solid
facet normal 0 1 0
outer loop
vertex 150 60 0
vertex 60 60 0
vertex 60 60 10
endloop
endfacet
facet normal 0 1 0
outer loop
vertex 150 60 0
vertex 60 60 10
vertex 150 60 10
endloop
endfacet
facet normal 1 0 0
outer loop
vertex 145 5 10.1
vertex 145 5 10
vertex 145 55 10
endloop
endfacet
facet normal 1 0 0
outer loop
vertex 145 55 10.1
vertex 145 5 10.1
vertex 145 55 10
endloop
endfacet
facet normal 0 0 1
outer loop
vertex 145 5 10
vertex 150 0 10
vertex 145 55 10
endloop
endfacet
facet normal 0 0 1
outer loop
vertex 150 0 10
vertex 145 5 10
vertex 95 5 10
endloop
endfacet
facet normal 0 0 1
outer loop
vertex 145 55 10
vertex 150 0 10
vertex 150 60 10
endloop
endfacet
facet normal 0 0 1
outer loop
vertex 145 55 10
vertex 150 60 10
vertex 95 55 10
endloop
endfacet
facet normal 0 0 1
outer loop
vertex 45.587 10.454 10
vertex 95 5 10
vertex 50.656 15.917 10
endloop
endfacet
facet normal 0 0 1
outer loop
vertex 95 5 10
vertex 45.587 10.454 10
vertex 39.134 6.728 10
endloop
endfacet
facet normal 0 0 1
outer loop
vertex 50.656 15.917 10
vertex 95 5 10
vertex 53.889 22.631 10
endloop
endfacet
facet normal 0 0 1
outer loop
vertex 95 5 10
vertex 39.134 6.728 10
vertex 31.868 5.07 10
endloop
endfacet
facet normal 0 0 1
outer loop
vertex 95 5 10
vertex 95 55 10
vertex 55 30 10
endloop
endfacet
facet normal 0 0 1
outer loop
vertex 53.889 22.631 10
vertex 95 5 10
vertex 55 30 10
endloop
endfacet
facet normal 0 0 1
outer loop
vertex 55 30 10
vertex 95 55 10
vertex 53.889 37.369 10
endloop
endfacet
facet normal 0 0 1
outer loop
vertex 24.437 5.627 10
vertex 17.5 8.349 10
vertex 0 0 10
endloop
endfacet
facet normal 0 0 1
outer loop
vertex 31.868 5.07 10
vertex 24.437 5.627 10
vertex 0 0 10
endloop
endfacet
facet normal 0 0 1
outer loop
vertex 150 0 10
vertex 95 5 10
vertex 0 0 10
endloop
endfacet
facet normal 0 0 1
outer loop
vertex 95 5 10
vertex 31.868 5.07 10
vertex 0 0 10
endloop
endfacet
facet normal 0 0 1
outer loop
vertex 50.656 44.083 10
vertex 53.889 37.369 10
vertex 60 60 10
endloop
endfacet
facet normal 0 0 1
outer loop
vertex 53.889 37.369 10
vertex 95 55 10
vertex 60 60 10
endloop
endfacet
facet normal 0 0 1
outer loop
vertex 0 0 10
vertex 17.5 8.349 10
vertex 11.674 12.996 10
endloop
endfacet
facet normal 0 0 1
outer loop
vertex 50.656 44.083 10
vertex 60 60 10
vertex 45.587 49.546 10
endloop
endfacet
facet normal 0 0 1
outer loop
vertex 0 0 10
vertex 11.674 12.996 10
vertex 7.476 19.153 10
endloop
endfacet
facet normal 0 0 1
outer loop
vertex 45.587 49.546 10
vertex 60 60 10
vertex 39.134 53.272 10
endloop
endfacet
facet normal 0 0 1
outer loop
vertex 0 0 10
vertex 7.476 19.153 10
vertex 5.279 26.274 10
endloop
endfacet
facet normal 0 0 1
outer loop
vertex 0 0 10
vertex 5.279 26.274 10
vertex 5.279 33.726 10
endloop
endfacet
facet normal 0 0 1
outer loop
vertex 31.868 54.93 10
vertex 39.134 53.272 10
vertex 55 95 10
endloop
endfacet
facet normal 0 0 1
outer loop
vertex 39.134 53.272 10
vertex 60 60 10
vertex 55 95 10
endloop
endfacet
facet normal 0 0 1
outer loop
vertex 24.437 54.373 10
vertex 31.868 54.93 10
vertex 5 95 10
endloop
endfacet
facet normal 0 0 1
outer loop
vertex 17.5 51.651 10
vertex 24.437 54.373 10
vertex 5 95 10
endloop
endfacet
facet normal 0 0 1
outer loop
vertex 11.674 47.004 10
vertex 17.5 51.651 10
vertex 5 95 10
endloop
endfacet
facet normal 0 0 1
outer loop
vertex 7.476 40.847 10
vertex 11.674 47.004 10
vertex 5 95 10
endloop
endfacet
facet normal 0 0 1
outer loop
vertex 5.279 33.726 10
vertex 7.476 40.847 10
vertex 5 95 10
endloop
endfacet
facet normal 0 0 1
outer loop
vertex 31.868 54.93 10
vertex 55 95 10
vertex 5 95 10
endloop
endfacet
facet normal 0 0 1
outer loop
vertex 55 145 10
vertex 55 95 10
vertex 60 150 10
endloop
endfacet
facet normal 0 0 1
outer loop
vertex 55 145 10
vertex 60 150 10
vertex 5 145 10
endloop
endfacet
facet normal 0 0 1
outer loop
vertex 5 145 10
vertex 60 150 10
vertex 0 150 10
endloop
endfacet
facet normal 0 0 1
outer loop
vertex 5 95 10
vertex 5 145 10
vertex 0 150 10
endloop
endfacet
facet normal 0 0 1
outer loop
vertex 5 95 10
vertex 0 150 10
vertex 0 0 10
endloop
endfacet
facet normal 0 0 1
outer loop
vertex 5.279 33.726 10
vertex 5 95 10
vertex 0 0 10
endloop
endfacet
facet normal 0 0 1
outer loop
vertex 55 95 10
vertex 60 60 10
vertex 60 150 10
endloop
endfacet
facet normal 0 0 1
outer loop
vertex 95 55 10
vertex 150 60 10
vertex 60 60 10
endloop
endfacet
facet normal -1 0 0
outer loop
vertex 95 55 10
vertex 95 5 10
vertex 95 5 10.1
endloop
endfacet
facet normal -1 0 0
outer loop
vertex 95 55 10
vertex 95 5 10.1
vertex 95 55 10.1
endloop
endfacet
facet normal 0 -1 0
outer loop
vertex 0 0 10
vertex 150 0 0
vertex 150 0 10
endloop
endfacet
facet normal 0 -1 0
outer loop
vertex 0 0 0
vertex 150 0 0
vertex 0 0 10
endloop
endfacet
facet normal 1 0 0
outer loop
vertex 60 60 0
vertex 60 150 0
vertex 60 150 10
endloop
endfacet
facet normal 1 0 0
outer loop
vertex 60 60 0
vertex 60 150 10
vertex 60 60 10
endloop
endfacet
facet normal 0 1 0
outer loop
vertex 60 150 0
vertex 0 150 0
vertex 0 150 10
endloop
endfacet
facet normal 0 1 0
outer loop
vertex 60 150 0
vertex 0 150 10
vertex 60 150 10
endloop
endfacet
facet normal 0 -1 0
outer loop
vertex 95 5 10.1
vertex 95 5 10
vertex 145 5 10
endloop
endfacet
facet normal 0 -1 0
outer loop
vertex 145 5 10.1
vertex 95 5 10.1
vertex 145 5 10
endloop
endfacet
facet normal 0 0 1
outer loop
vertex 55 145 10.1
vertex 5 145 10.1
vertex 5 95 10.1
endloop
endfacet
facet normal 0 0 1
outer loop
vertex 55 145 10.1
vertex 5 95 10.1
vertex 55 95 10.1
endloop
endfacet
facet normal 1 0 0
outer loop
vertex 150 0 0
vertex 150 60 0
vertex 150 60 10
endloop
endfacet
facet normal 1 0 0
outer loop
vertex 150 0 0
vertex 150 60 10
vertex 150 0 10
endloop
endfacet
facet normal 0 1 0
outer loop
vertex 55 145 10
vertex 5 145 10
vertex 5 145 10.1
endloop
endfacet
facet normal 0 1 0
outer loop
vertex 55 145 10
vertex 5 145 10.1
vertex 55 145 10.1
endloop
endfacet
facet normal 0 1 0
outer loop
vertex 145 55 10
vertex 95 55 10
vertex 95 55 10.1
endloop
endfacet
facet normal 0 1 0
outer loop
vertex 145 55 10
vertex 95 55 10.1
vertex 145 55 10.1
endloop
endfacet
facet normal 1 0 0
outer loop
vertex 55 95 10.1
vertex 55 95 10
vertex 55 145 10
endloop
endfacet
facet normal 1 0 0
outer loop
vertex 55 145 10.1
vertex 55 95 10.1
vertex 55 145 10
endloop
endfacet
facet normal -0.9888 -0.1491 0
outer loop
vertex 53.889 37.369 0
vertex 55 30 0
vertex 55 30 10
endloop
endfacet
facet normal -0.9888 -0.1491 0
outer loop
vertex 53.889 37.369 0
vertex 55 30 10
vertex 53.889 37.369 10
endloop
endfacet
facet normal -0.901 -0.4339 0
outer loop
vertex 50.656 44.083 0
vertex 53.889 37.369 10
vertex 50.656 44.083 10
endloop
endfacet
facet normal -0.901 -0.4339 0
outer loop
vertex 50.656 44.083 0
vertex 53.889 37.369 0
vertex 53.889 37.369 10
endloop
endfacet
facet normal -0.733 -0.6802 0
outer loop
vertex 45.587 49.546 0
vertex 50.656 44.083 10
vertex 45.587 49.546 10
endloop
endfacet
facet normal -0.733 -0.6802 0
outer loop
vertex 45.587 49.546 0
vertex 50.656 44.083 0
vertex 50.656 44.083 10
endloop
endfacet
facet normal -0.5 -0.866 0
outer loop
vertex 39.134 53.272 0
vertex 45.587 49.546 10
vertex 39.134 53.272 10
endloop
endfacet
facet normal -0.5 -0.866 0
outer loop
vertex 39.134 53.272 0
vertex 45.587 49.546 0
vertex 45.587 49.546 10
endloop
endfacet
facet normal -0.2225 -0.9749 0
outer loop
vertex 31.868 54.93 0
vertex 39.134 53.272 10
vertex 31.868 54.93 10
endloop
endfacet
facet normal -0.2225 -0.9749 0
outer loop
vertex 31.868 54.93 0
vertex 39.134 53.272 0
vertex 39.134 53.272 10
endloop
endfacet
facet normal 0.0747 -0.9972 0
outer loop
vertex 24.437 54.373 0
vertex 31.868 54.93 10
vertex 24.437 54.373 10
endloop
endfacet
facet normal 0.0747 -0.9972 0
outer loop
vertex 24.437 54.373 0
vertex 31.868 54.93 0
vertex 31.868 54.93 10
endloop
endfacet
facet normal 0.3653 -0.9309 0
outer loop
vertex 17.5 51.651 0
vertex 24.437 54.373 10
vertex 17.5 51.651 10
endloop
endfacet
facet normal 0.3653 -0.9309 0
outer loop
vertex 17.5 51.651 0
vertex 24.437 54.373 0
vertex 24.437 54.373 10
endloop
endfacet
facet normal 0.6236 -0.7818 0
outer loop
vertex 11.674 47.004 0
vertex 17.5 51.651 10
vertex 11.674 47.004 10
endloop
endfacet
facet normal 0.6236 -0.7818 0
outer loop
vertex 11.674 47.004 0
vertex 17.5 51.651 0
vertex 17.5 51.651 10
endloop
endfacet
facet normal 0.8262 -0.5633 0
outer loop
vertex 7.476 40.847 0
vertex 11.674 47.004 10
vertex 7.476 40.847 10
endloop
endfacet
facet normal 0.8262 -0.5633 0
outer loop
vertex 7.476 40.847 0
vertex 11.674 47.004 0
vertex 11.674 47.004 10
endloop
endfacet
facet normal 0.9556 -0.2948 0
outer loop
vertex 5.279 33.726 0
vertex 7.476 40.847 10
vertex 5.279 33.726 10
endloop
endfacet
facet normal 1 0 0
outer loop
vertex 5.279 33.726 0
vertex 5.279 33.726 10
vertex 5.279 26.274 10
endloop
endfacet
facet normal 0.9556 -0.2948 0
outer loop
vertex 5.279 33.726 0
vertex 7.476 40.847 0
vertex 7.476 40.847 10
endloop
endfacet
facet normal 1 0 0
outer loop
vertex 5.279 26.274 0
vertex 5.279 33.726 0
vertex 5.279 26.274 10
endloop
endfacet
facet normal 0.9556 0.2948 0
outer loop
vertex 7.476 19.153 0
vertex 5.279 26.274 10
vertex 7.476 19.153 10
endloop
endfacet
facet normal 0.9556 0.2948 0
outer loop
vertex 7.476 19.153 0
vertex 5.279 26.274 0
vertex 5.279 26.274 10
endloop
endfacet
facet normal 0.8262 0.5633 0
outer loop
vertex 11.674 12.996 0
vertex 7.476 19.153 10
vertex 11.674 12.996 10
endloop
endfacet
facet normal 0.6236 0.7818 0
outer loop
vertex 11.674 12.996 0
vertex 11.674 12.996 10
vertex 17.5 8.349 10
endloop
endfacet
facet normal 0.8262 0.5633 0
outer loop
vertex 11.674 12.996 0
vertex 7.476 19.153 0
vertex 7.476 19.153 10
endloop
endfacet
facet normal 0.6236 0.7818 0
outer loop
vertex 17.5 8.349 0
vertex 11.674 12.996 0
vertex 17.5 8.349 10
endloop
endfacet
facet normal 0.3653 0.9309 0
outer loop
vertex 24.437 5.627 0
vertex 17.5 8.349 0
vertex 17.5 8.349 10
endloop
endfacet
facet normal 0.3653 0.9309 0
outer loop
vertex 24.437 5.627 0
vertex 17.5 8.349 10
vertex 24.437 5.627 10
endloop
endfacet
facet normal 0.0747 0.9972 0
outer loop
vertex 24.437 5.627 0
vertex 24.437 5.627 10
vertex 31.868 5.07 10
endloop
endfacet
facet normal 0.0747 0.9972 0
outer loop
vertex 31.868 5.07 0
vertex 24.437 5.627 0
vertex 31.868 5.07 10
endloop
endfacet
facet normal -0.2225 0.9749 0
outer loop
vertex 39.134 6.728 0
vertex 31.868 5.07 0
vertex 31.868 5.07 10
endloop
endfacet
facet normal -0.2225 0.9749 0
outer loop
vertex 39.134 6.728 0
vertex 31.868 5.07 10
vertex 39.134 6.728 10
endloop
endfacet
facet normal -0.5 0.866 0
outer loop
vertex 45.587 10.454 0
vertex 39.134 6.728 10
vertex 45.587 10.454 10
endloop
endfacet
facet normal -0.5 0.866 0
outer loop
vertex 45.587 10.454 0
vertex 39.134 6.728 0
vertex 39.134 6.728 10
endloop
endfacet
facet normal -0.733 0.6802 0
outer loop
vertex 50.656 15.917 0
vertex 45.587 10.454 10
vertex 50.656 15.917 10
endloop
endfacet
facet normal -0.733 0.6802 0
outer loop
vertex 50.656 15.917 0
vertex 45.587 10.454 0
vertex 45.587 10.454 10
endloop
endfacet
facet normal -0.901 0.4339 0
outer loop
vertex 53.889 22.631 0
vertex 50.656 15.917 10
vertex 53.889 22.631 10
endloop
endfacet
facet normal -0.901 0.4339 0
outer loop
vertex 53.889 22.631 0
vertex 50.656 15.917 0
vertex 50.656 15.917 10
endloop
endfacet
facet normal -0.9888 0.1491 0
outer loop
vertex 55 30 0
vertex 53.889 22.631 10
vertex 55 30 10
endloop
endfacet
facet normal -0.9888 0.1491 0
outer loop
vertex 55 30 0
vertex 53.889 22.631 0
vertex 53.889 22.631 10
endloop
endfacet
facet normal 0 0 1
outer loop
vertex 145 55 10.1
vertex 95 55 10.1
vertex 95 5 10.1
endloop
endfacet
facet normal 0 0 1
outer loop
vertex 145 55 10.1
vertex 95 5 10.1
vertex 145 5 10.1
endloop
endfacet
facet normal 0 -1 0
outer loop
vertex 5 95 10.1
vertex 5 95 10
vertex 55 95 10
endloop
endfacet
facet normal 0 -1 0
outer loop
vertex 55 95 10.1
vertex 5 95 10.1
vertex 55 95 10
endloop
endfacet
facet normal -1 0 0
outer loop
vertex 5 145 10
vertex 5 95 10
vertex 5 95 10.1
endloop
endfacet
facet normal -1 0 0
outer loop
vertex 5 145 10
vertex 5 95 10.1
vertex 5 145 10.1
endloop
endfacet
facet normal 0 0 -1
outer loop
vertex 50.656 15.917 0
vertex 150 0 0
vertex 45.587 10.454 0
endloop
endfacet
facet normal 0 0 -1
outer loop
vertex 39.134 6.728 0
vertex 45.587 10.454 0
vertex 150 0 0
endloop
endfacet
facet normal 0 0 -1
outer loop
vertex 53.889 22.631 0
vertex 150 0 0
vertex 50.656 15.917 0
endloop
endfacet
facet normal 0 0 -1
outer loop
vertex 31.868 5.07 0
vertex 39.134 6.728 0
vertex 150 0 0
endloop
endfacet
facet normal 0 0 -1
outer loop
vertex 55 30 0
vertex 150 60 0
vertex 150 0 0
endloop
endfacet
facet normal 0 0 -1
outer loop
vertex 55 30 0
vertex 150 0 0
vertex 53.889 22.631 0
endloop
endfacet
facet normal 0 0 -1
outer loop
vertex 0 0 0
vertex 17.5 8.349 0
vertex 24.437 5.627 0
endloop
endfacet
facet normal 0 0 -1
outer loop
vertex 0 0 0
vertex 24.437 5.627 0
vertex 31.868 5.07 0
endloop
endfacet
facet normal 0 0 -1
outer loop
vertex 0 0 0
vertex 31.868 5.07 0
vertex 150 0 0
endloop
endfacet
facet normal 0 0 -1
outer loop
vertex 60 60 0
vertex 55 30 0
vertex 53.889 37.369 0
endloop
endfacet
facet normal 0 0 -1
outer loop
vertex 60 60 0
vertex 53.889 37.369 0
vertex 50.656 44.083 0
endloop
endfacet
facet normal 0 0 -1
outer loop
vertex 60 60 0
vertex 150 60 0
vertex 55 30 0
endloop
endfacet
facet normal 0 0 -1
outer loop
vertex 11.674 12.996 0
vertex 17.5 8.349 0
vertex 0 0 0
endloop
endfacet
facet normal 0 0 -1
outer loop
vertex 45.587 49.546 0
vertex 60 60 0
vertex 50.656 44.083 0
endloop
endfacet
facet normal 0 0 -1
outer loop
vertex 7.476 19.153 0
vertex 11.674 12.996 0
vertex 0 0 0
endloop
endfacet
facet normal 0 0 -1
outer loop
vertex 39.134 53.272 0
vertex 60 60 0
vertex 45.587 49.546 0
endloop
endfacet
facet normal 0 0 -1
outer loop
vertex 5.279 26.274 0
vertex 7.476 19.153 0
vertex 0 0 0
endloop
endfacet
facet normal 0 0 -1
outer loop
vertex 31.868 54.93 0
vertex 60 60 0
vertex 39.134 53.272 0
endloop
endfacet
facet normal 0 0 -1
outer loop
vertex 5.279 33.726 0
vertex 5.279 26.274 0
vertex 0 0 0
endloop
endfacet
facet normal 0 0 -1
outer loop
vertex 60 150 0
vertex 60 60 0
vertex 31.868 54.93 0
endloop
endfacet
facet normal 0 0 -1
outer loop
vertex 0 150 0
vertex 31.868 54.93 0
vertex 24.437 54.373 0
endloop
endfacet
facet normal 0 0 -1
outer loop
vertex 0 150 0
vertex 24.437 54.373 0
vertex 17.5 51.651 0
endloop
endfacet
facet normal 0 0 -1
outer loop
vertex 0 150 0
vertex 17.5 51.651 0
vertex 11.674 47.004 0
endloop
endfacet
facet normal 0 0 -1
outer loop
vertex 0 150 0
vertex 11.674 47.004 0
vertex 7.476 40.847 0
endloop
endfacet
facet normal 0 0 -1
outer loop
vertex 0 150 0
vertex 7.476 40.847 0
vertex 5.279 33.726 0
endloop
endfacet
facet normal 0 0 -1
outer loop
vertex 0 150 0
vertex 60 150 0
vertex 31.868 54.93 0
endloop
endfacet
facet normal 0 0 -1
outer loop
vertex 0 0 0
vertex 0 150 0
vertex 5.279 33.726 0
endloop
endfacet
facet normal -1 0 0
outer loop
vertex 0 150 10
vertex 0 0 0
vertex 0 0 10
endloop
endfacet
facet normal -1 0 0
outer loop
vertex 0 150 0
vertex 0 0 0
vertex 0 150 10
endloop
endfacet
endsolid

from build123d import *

# Parameters (mm, degrees)
SKETCH1_R           = 25
BOSS_EXTRUDE1_DEPTH = 10
SKETCH2_W           = 50
SKETCH2_H           = 50
BOSS_EXTRUDE2_DEPTH = 0.1


with BuildPart() as part:
    # Sketch1 → Boss-Extrude1 (new body)
    with BuildSketch(Plane.XY):
        Polygon((0, 0), (0, 150), (60, 150), (60, 60), (150, 60), (150, 0), align=None)
        with Locations((30, 30)):
            Circle(SKETCH1_R, mode=Mode.SUBTRACT)
    extrude(amount=BOSS_EXTRUDE1_DEPTH)

    # Sketch2 → Boss-Extrude2 (add)
    with BuildSketch(Plane.XY.offset(10)):
        with Locations((30, 120)):
            Rectangle(SKETCH2_W, SKETCH2_H)
        with Locations((120, 30)):
            Rectangle(SKETCH2_W, SKETCH2_H)
    extrude(amount=BOSS_EXTRUDE2_DEPTH)


solid = part.part
